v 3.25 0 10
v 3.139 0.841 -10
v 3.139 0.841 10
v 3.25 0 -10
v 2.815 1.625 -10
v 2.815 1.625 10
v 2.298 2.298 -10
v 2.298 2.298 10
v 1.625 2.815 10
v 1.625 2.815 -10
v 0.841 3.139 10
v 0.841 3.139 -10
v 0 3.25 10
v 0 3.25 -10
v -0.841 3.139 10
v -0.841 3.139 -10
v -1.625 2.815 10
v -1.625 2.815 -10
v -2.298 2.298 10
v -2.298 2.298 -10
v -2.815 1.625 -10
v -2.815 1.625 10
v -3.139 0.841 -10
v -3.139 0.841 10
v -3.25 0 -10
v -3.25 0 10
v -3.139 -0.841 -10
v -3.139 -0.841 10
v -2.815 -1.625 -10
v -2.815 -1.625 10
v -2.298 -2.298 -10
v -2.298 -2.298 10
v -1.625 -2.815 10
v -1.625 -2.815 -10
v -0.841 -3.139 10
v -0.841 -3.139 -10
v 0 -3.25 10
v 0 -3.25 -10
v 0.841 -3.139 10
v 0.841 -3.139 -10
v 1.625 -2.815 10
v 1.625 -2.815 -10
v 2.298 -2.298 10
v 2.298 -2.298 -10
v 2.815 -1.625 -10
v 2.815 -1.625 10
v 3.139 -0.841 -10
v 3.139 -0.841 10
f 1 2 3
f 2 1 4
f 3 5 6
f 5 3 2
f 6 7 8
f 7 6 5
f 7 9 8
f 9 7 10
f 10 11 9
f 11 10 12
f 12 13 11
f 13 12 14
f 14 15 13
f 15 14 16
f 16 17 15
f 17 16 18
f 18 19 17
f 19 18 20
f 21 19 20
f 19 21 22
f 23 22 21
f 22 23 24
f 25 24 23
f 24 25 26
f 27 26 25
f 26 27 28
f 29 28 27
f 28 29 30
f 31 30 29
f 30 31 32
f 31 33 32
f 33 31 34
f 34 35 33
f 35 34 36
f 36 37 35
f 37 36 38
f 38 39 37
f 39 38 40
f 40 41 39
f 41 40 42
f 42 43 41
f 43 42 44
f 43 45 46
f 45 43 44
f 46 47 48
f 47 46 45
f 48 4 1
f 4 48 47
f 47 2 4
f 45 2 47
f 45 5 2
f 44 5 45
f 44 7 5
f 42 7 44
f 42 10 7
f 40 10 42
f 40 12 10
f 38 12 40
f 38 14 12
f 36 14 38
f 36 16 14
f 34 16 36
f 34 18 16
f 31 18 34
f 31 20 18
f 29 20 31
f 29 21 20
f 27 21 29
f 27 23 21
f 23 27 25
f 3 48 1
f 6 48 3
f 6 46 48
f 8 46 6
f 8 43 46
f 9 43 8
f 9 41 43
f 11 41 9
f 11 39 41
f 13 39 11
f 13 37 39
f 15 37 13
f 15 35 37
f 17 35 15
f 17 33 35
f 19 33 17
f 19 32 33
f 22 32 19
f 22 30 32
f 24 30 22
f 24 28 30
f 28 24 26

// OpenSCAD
// file: rack_params.scad
// 推出模块共享参数 - 所有零件文件和装配预览文件通过 include 引用此文件
// 此文件仅放参数定义（变量赋值），不放任何 geometry 语句

// ---------- 底板参数 (引用自 sliding_track_base.scad) ----------
base_w   = 30;
base_l   = 90;
base_t   = 5;
groove_w = 26;
groove_d = 1.5;

// ---------- 齿条参数 ----------
modulus     = 1.0;                    // 齿轮模数
pitch       = PI * modulus;           // 齿距 p
addendum    = 1.0 * modulus;          // 齿顶高
dedendum    = 1.2 * modulus;          // 齿根高
tooth_thick = pitch / 2;              // 齿厚

rack_w     = 8;                       // 齿条宽 (X)
rack_thick = 3.5;                     // 齿条厚 (Z) - 仅含齿高部分（与齿轮啮合计算用）
rack_base_h = 5;                      // 齿条基体加厚高度（专门为底部粘贴预留），不含齿高
rack_len   = 140;                     // 齿条长 (Y) — 由原 70mm 改为 140mm
tooth_cnt  = floor(rack_len / pitch); // 齿条齿数

// ---------- 推头参数 ----------
pusher_w     = 23;                    // 推头宽 (< groove_w=26)
pusher_tab_t = 1.5;                   // 竖板厚 (< groove_d=1.5)
pusher_arm_t = 1.5;                   // 横板厚
blocker_h    = 20;                    // 竖板总高度（从齿条顶面起算）= 底板厚(5) + 药盒高(13.5) + 余量(1.5)
                                     //  作用：推头到达行程终点时高出底板 15mm 堵住上方药匣出药口

// ---------- 齿轮参数 ----------
gear_teeth   = 20;                    // 齿轮齿数
gear_r       = gear_teeth * modulus / 2;   // 分度圆半径
gear_outer_r = gear_r + addendum;          // 齿顶圆半径
gear_root_r  = gear_r - dedendum;          // 齿根圆半径
gear_w       = rack_w;                     // 齿轮厚度 (Z)
shaft_d      = 6.5;                         // 电机轴径（6.5mm 轴孔）
shaft_len    = 20;                         // 轴长

// ---------- 轴座参数 ----------
bearing_block_w = 12;
bearing_block_d = 10;
bearing_block_h = 8;
bearing_hole_d  = 6.7;                     // 6.5mm电机轴 + 0.2mm间隙
mount_hole_d    = 3.2;                     // M3 安装孔

// ---------- 装配坐标 ----------
rack_x   = (base_w - rack_w) / 2;         // 齿条X起点 (底板X中心)
rack_z   = -rack_thick;                   // 齿条Z底面 (底板Z=0下方)
rack_y0  = -20;                           // 齿条Y起点 (在底板Y=0外)

gear_cx = base_w / 2;                     // 齿轮X中心
gear_cy = base_l - 5;                     // 齿轮Y中心 (底板Y=90末端内侧)
gear_cz = rack_z + rack_thick / 2;        // 齿轮Z中心 (齿条厚度中线)

bearing_y   = gear_cy;                    // 轴座Y中心
mount_inset = 5;
eps         = 0.01;
// main file
// shaft.scad - φ6.5 × 20mm 电机轴套（直接用电机轴，不需打印）
// 局部坐标系：轴中心在 (0,0,0)，Z 从 -shaft_len/2 到 +shaft_len/2
// 用途：直接使用 6.5mm 电机轴，穿过齿轮中心，由两侧轴座支撑
// 此文件保留作参考，实际装配时直接用电机轴即可，不需要打印

include <rack_params.scad>

module shaft() {
    color("Silver")
    translate([0, 0, -shaft_len / 2])
        cylinder(h = shaft_len, r = shaft_d / 2, center = false, $fn = 24);
}

// 独立渲染（参考用）
shaft();
